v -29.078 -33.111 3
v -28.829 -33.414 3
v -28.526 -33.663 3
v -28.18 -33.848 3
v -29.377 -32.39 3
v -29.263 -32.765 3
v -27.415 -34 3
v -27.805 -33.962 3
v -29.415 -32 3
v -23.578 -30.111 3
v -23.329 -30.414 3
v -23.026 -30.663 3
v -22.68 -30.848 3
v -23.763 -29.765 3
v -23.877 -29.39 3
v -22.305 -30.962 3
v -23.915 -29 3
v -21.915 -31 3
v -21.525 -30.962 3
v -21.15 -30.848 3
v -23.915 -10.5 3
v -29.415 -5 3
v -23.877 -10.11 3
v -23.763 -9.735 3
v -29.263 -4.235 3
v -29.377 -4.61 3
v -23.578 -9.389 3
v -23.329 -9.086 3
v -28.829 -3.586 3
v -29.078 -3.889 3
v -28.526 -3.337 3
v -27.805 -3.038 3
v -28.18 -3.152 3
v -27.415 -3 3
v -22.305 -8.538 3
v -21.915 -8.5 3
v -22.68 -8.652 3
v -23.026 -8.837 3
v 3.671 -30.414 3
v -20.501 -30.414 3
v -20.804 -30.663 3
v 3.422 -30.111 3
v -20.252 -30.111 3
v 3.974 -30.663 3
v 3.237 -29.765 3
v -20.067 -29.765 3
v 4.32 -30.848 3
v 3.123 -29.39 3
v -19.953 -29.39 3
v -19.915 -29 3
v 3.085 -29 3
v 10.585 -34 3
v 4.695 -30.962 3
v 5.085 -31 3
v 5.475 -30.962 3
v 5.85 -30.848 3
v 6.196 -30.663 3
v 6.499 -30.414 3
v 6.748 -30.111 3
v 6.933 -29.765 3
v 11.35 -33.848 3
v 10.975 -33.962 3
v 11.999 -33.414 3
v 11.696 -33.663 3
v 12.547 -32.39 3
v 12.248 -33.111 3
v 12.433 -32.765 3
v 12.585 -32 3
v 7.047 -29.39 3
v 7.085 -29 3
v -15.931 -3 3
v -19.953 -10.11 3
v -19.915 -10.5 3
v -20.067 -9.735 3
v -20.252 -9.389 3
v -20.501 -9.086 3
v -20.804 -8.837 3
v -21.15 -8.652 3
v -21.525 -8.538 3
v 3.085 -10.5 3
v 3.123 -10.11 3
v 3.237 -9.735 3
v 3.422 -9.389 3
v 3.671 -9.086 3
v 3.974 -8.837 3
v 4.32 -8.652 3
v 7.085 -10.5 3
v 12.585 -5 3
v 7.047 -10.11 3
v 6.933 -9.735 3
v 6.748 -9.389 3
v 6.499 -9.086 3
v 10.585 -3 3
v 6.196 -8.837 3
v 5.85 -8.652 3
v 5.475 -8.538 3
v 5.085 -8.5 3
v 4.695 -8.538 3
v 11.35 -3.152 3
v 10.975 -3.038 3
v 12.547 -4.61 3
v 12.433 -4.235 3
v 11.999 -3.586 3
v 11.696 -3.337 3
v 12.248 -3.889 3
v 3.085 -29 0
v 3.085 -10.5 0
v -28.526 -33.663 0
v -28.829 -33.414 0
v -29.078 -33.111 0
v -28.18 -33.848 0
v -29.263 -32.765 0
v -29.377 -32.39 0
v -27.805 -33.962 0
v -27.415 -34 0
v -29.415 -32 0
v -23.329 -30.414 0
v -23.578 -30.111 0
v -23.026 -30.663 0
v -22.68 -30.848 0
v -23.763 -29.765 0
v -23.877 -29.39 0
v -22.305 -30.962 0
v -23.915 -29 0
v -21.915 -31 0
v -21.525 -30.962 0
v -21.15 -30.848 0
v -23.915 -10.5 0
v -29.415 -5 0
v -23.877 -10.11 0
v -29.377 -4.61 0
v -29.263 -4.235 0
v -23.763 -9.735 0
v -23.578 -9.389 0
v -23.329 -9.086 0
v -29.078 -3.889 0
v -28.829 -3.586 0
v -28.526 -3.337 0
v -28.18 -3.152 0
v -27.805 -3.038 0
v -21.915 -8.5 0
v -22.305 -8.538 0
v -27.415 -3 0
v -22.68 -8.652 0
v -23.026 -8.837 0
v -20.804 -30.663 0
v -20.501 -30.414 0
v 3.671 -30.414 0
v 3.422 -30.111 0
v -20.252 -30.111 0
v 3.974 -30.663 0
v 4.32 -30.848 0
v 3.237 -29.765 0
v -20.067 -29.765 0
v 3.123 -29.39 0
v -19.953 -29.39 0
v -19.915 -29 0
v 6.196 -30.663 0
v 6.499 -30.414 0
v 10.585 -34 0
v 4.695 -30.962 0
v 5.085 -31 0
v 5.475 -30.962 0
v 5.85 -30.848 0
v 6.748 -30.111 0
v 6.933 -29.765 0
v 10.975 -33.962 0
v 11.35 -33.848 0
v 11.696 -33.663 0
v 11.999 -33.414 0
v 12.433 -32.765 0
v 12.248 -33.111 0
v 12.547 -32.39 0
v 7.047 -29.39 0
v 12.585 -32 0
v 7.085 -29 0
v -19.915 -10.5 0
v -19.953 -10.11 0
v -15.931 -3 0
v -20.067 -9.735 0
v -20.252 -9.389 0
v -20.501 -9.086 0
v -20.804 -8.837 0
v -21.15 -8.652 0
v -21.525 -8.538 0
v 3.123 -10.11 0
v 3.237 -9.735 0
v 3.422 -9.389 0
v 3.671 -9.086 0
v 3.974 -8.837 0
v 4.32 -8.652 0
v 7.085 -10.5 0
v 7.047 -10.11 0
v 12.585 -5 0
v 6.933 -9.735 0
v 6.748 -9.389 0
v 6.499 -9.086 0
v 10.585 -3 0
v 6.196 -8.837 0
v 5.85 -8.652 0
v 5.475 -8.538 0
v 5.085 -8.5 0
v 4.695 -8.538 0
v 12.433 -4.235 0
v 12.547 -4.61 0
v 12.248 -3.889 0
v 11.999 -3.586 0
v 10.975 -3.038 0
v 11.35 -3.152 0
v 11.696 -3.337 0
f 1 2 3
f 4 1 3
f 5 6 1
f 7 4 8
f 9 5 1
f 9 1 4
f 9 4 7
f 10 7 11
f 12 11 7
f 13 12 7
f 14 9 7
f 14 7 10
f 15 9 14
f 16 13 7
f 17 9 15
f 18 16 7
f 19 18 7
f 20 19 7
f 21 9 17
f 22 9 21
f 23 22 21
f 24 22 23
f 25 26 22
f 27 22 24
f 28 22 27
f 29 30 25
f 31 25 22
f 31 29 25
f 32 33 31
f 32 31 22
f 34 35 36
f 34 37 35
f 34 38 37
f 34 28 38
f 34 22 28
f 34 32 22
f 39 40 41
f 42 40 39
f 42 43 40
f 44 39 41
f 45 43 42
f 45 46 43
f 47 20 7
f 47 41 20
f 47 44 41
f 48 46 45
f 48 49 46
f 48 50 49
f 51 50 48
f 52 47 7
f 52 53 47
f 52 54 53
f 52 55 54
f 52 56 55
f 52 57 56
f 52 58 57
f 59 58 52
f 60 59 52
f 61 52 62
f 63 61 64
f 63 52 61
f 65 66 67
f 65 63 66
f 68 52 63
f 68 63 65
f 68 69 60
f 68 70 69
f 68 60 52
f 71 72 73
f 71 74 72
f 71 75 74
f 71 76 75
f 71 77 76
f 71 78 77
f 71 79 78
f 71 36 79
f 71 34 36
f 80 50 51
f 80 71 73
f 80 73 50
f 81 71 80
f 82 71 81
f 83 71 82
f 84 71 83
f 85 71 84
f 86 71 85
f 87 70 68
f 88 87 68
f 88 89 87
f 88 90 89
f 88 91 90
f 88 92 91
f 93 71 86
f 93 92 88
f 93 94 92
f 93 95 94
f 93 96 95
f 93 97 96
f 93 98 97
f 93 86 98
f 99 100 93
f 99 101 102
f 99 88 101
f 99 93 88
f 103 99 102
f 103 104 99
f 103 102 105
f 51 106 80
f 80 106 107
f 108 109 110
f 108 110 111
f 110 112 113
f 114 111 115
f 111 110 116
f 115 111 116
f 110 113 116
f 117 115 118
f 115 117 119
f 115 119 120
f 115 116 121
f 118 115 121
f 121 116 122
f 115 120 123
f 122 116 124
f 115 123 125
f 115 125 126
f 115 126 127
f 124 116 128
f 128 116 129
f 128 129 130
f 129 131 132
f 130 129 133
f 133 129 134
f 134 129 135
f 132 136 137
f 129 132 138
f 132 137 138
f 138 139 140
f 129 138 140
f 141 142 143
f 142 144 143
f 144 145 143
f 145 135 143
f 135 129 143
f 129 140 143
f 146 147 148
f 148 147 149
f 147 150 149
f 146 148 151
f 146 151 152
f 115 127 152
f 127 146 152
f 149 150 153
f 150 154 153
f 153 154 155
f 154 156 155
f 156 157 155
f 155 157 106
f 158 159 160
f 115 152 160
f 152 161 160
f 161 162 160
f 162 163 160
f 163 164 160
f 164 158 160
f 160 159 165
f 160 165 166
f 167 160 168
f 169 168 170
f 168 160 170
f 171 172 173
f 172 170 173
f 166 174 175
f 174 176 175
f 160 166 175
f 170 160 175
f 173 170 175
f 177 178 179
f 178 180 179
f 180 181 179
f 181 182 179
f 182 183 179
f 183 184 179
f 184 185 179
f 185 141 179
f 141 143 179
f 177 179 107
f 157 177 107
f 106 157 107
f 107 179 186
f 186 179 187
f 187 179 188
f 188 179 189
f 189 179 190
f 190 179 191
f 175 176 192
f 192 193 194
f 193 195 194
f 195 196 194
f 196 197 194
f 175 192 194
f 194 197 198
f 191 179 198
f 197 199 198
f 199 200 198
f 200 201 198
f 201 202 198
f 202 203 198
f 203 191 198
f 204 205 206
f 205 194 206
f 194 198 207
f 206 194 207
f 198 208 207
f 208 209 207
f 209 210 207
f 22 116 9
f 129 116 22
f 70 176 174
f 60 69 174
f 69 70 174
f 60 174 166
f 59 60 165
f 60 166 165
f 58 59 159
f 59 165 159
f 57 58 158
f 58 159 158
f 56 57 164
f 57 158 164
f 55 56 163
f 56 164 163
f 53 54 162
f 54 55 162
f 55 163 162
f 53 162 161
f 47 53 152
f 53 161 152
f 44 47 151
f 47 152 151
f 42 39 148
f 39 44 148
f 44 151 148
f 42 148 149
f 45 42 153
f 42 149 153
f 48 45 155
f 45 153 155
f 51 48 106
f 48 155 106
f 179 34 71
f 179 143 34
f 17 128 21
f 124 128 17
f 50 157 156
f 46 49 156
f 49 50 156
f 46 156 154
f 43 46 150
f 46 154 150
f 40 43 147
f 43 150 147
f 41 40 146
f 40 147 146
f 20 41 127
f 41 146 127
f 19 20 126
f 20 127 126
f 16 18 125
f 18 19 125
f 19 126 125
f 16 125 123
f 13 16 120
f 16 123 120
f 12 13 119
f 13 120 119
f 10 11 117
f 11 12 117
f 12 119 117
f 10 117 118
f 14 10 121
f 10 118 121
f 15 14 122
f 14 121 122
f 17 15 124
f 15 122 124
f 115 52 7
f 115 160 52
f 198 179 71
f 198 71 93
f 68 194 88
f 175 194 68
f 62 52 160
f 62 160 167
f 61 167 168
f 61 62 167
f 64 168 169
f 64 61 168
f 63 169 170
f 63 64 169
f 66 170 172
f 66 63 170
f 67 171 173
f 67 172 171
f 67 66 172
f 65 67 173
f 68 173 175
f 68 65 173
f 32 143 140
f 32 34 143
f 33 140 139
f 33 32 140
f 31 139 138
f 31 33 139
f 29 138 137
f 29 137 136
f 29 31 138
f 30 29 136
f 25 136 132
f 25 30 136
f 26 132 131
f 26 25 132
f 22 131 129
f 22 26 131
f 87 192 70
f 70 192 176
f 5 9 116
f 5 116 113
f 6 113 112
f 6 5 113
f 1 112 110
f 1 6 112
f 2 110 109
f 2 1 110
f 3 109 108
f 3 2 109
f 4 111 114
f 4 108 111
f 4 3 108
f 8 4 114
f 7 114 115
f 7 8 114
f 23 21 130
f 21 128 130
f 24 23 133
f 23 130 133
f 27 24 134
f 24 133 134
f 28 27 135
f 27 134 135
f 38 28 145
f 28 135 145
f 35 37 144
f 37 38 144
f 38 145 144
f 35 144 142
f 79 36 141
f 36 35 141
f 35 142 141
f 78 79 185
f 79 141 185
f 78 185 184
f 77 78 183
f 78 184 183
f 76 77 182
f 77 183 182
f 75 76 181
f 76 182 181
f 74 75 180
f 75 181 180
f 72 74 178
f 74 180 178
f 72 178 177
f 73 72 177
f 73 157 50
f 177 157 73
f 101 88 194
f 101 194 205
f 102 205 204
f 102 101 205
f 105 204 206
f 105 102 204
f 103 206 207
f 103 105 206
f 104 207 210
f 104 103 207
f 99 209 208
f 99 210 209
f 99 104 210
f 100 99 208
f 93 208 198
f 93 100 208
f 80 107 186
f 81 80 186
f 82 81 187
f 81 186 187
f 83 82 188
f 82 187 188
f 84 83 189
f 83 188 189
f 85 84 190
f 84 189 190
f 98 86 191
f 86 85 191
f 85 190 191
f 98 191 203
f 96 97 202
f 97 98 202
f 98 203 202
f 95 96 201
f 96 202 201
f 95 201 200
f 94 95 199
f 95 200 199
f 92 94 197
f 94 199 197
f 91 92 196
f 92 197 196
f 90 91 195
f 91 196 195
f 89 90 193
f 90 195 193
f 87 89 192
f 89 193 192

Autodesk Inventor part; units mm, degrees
ref_plane "YZ Plane" through (0, 0, 0) normal (1, 0, 0) x (0, 1, 0)
ref_plane "XZ Plane" through (0, 0, 0) normal (0, 1, 0) x (-1, 0, 0)
ref_plane "XY Plane" through (0, 0, 0) normal (0, 0, 1) x (1, 0, 0)
sketch "Sketch1" plane through (0, 0, 0) normal (0, 0, 1) x (1, 0, 0)
  line L0 (-29.415, -3) -> (12.585, -3)
  line L1 (12.585, -3) -> (12.585, -34)
  line L2 (12.585, -34) -> (-29.415, -34)
  line L3 (-29.415, -34) -> (-29.415, -3)
  line L4 (-29.6345, -34) -> (12.8045, -34)
  line L5 (-29.415, -3) -> (-15.931, -3)
  line L6 (-8.415, -407.2393) -> (-8.415, 249.8336) construction
  line L7 (-29.415, -18) -> (-29.415, -3) construction
  circle A0 centre (-21.915, -10.5) radius 2 construction
  circle A1 centre (5.085, -10.5) radius 2 construction
  circle A2 centre (-21.915, -29) radius 2.33 construction
  circle A3 centre (5.085, -29) radius 2.33 construction
  line L8 (-21.915, -10.5) -> (5.085, -10.5) construction
  line L9 (-21.915, -29) -> (5.085, -29) construction
  circle A4 centre (-21.915, -10.5) radius 2 construction
  circle A5 centre (5.085, -10.5) radius 2 construction
  circle A6 centre (5.085, -29) radius 2
  circle A7 centre (-21.915, -29) radius 2
  line L10 (-21.915, -10.5) -> (-21.915, -29) construction
  line L11 (-23.915, -10.5) -> (-23.915, -29)
  line L12 (-19.915, -29) -> (-19.915, -10.5)
  arc A8 (-19.915, -10.5) -> (-23.915, -10.5) centre (-21.915, -10.5) ccw
  arc A9 (-23.915, -29) -> (-19.915, -29) centre (-21.915, -29) ccw
  circle A10 centre (-21.915, -10.5) radius 2 construction
  line L13 (7.085, -10.5) -> (7.085, -29)
  line L14 (3.085, -29) -> (3.085, -10.5)
  arc A11 (7.085, -10.5) -> (3.085, -10.5) centre (5.085, -10.5) ccw
  arc A12 (3.085, -29) -> (7.085, -29) centre (5.085, -29) ccw
  point P0 (0, 0)
  point P1 (-8.415, -34)
  point P2 (-21.915, -19.75)
  point P3 (7.085, -29)
extrude "Plate1" add sketch "Sketch1" along normal blind 3
fillet "Fillet1" radius 2 4 edges at (-29.415, -34, 1.5) (12.585, -34, 1.5) (-29.415, -3, 1.5) (12.585, -3, 1.5)
equation "\"d7\" = Thickness"
equation "\"BendRadius\" = Thickness"
equation "\"BendReliefWidth\" = Thickness"
equation "\"BendReliefDepth\" = 0.5 * Thickness"
equation "\"CornerReliefSize\" = 4 * Thickness"
equation "\"MinimumRemnant\" = 2 * Thickness"
equation "\"TransitionRadius\" = BendRadius"
equation "\"JacobiRadiusSize\" = BendRadius"
equation "\"GapSize\" = Thickness"
equation "\"Thickness\" = 3"
properties part number "CameraMount"
